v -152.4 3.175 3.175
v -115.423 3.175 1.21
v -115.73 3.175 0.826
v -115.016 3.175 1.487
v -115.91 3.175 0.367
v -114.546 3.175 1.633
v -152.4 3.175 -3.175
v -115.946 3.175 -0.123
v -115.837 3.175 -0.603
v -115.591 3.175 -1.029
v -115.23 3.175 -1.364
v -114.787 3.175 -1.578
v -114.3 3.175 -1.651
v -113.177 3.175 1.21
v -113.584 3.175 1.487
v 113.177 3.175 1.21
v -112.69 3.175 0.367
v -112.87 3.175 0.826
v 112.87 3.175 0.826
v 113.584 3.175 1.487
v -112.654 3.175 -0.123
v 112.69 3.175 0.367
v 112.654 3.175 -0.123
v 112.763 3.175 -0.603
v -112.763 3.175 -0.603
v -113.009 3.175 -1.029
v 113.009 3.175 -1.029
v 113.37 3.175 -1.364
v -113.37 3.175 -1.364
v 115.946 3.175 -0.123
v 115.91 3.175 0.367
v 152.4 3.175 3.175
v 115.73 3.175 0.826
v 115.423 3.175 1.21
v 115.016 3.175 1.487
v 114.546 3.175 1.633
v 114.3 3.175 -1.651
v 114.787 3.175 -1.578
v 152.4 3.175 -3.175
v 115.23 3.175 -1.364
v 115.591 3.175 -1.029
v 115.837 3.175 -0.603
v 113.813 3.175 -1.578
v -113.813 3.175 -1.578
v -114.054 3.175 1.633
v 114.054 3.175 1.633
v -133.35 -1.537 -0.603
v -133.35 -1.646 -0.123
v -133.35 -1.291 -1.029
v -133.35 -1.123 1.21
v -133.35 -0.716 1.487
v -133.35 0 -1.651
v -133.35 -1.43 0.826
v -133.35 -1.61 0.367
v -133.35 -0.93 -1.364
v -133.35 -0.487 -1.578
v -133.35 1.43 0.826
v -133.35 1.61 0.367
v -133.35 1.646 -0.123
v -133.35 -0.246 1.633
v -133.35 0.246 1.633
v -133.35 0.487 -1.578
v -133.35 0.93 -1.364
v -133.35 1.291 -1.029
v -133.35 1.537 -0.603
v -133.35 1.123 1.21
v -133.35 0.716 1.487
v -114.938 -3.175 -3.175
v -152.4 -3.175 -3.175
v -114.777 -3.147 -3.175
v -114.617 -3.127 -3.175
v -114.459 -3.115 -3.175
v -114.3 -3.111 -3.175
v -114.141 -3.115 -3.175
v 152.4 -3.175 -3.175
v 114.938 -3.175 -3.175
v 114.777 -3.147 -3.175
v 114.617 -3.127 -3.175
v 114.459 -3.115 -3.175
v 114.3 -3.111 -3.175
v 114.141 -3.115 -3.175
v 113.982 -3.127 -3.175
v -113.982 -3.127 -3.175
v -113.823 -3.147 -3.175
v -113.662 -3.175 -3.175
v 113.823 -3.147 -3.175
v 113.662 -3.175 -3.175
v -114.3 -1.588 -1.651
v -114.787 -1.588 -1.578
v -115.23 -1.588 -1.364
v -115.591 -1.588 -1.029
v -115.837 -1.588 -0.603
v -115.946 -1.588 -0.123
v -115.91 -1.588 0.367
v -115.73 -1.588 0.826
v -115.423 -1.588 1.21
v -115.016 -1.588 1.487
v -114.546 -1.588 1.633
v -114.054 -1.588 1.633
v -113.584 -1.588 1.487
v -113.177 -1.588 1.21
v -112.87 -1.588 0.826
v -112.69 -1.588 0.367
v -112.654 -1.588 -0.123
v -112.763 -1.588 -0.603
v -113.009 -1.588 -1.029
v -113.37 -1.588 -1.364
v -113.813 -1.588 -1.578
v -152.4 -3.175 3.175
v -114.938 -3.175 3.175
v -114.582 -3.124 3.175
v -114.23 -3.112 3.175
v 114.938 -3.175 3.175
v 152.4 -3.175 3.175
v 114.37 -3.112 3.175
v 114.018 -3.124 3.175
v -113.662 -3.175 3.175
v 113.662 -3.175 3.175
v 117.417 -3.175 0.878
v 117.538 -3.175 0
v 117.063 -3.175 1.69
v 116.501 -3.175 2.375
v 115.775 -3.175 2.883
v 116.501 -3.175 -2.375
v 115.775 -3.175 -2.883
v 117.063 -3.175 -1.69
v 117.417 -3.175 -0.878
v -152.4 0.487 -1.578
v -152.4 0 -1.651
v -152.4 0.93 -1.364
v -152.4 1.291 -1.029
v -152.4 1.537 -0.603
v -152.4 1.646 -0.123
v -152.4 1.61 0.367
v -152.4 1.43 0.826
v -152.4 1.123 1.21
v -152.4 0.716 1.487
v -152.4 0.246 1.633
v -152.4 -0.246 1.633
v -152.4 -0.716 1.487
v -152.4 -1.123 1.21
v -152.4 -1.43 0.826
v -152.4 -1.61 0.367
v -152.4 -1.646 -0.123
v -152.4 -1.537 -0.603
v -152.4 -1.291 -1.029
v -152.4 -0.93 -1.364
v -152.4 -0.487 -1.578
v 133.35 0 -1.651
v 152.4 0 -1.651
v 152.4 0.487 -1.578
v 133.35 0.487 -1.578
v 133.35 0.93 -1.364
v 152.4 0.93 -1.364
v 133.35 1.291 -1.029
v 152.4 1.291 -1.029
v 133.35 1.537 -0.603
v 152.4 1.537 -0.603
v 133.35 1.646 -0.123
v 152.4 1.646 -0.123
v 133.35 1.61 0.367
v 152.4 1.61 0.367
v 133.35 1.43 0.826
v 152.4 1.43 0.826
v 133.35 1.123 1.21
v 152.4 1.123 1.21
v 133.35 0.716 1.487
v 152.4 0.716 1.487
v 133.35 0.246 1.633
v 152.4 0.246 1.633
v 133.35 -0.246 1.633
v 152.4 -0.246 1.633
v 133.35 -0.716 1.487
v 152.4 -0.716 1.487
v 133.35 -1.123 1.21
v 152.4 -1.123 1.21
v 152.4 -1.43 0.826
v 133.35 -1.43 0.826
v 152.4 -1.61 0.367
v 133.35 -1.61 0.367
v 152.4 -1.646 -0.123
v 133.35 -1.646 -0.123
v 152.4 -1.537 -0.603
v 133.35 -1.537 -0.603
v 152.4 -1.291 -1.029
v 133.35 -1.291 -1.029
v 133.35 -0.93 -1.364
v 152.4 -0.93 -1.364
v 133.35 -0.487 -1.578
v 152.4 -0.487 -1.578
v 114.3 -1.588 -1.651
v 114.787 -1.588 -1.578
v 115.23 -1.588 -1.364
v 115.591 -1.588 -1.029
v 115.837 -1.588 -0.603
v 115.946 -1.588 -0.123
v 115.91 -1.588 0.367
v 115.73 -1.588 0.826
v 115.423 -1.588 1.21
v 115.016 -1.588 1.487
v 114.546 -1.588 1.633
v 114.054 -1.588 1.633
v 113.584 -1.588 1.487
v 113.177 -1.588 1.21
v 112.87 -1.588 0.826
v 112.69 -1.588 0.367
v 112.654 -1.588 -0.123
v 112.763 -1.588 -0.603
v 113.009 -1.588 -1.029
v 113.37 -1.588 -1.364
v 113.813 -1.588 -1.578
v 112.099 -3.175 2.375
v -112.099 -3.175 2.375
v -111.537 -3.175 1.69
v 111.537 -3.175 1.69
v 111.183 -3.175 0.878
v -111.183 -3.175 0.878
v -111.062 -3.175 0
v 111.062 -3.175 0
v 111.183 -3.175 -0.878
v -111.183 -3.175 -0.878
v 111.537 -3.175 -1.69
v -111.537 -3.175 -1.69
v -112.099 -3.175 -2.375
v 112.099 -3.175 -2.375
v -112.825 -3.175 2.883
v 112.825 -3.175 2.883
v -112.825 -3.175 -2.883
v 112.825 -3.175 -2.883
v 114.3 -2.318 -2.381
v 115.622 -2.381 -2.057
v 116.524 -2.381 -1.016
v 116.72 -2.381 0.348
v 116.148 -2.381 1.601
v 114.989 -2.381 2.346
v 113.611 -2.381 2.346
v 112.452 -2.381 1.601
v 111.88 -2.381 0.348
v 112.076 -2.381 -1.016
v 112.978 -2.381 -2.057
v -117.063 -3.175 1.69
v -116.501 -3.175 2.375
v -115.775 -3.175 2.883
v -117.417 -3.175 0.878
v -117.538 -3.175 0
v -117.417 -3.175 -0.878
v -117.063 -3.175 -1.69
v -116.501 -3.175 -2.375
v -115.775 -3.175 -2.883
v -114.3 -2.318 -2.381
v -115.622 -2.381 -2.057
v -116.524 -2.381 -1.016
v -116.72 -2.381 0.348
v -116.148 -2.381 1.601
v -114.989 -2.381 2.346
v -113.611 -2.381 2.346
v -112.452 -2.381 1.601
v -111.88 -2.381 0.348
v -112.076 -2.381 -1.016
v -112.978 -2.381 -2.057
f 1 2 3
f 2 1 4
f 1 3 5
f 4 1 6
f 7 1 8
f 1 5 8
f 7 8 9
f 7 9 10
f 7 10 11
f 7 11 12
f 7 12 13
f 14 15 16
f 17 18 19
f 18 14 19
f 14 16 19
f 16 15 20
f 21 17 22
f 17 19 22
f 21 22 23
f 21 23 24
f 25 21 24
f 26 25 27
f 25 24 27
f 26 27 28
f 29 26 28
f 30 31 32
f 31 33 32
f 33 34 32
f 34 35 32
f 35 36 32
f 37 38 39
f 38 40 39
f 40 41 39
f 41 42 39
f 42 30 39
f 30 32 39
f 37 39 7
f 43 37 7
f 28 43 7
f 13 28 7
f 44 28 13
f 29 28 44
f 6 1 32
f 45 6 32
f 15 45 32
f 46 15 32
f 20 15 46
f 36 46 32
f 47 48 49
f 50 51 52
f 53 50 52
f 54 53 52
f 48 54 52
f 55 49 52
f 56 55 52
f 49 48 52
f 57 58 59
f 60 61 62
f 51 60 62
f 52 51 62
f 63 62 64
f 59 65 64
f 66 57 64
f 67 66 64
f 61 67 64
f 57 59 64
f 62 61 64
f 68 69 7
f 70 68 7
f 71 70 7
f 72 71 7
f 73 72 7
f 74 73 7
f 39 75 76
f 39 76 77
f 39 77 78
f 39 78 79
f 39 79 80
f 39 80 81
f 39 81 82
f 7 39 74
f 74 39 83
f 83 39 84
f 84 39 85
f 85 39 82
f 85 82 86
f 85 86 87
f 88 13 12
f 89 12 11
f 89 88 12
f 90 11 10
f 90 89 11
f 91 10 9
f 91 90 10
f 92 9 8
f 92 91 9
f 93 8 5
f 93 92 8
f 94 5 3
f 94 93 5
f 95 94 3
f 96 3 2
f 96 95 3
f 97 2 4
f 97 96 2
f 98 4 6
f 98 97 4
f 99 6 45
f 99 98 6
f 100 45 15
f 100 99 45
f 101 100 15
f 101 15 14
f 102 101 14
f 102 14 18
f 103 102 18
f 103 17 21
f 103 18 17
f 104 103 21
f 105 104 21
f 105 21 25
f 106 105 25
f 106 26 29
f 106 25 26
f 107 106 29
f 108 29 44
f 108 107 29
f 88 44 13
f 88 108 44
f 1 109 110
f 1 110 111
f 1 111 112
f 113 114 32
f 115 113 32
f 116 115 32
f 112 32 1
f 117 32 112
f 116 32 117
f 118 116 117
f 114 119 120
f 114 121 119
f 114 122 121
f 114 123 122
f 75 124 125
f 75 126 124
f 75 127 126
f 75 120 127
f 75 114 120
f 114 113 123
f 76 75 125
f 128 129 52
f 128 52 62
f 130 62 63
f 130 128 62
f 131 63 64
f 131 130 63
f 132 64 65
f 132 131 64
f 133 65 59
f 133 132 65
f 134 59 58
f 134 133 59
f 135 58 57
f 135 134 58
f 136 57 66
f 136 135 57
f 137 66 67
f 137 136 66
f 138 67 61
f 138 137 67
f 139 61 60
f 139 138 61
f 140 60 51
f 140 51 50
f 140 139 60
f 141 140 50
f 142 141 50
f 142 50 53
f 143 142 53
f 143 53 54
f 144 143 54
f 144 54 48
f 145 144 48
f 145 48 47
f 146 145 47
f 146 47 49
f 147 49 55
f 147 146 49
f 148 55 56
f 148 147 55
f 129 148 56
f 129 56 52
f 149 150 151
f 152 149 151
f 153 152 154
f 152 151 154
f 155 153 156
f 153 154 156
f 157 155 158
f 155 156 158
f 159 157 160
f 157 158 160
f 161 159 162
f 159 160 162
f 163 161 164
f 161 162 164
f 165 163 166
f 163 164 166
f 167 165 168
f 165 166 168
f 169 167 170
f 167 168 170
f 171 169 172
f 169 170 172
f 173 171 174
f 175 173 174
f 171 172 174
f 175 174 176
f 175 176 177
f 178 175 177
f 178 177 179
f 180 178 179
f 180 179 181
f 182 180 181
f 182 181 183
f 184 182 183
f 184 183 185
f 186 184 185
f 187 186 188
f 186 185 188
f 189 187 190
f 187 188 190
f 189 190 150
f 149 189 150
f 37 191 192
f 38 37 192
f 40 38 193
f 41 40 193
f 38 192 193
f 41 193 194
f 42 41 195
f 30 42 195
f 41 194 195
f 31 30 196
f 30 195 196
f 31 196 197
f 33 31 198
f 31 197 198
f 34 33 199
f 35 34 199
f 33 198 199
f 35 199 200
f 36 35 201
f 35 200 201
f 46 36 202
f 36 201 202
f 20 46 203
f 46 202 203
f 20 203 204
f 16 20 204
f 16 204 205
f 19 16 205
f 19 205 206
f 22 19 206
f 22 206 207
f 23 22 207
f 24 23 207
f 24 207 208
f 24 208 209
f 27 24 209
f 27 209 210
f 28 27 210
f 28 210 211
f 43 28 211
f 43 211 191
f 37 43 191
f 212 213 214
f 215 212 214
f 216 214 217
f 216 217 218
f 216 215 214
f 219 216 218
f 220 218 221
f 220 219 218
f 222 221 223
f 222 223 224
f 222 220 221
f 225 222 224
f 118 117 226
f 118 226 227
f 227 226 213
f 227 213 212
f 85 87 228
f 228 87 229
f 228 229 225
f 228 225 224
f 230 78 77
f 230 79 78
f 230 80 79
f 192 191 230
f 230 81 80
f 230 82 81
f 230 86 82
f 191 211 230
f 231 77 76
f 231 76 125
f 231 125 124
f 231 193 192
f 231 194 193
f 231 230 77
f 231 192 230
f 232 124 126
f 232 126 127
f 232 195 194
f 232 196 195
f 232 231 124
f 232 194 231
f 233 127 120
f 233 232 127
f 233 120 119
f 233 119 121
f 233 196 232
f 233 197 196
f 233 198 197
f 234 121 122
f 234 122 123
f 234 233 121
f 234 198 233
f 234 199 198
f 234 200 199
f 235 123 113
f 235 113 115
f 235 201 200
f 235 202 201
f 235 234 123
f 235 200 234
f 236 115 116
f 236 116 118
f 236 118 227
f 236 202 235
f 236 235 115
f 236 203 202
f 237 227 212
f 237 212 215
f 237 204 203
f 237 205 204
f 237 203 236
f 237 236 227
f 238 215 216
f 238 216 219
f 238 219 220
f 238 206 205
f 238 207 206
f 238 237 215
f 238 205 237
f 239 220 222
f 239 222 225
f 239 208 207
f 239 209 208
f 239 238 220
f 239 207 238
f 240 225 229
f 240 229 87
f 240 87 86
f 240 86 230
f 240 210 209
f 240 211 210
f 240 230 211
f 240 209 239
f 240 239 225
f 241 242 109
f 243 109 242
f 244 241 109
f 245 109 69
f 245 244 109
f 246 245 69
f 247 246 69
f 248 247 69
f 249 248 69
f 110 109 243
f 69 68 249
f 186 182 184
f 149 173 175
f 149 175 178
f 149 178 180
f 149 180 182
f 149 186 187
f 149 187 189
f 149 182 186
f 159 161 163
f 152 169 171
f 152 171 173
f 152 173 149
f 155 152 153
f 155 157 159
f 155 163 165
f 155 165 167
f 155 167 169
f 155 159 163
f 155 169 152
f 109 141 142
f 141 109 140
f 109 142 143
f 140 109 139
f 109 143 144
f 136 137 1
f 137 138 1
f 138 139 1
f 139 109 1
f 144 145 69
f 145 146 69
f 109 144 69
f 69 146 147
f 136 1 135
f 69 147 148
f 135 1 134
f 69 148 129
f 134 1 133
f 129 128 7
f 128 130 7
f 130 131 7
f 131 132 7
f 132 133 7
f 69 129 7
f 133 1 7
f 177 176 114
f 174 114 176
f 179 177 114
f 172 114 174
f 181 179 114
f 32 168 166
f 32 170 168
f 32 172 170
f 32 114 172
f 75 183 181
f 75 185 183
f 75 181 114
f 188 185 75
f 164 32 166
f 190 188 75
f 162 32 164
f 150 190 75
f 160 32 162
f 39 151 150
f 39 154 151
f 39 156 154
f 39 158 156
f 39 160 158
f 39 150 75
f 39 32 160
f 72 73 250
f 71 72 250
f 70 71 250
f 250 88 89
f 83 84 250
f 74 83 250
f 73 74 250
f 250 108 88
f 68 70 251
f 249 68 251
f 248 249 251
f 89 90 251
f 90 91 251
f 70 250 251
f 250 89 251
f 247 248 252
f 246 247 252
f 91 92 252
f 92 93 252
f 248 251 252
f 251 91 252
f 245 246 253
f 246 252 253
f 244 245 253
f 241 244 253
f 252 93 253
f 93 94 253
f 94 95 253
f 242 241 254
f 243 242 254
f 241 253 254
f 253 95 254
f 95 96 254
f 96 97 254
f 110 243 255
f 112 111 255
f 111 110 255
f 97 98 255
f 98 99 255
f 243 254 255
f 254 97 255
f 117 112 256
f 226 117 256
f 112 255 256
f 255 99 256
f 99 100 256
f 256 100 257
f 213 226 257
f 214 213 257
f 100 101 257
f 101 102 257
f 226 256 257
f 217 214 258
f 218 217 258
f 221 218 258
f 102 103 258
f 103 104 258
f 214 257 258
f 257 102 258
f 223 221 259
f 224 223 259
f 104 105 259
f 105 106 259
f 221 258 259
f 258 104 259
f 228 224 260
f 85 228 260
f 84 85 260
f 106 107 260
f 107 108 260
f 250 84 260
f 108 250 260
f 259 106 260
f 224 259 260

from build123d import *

# Parameters (mm, degrees)
SKETCH1_W                = 6.35
SKETCH1_H                = 6.35
BOSS_EXTRUDE1_DEPTH      = 152.4
SKETCH2_R                = 1.651
CUT_EXTRUDE1_DEPTH       = 19.05
SKETCH3_R                = 1.651
CUT_EXTRUDE2_DEPTH       = 153.565274965
CHAMFER1_SIZE            = 1.5875
CHAMFER1_OF_MIRROR1_SIZE = 1.5875


with BuildPart() as part:
    # Sketch1 → Boss-Extrude1 (new, symmetric)
    with BuildSketch(Plane(origin=(0, 0, 0), x_dir=(0, 0, -1), z_dir=(1, 0, 0))):
        Rectangle(SKETCH1_W, SKETCH1_H)
    extrude(amount=BOSS_EXTRUDE1_DEPTH, both=True)

    # Sketch2 → Cut-Extrude1 (cut)
    with BuildSketch(Plane(origin=(152.4, 0, 0), x_dir=(0, 0, -1), z_dir=(1, 0, 0))):
        Circle(SKETCH2_R)
    cut_extrude1 = extrude(amount=-CUT_EXTRUDE1_DEPTH, mode=Mode.SUBTRACT)

    # Sketch3 → Cut-Extrude2 (cut, through all)
    with BuildSketch(Plane(origin=(0, -3.175, 0), x_dir=(-1, 0, 0), z_dir=(0, -1, 0))):
        with Locations(Location((-114.3, 0, 0), (0, 0, 90))):
            Circle(SKETCH3_R)
    cut_extrude2 = extrude(amount=-CUT_EXTRUDE2_DEPTH, mode=Mode.SUBTRACT)

    # Chamfer1
    # the kernel refuses this chamfer: 1.5875 mm, written as the material it takes off along each edge
    with BuildSketch(Plane(origin=(114.3, -3.175, 0), x_dir=(0, 0, -1), z_dir=(-1, 0, 0))) as chamfer1_piece_1:
        Polygon((1.651 + CHAMFER1_SIZE, 0), (1.651, -CHAMFER1_SIZE), (1.651, 0), align=None)
    revolve(axis=Axis((114.3, -3.175, 0), (0, -1, 0)), mode=Mode.SUBTRACT)

    # Mirror1: Cut-Extrude1, Cut-Extrude2 across plane
    add(cut_extrude1.mirror(Plane(origin=(0, 0, 0), x_dir=(0, 0, 1), z_dir=(1, 0, 0))), mode=Mode.SUBTRACT)
    add(cut_extrude2.mirror(Plane(origin=(0, 0, 0), x_dir=(0, 0, 1), z_dir=(1, 0, 0))), mode=Mode.SUBTRACT)

    # Chamfer1 of Mirror1
    # the kernel refuses this chamfer: 1.5875 mm, written as the material it takes off along each edge
    with BuildSketch(Plane(origin=(-114.3, -3.175, 0), x_dir=(0, 0, -1), z_dir=(1, 0, 0))) as chamfer1_of_mirror1_piece_1:
        Polygon((1.651 + CHAMFER1_OF_MIRROR1_SIZE, 0), (1.651, CHAMFER1_OF_MIRROR1_SIZE), (1.651, 0), align=None)
    revolve(axis=Axis((-114.3, -3.175, 0), (0, 1, 0)), mode=Mode.SUBTRACT)


solid = part.part
